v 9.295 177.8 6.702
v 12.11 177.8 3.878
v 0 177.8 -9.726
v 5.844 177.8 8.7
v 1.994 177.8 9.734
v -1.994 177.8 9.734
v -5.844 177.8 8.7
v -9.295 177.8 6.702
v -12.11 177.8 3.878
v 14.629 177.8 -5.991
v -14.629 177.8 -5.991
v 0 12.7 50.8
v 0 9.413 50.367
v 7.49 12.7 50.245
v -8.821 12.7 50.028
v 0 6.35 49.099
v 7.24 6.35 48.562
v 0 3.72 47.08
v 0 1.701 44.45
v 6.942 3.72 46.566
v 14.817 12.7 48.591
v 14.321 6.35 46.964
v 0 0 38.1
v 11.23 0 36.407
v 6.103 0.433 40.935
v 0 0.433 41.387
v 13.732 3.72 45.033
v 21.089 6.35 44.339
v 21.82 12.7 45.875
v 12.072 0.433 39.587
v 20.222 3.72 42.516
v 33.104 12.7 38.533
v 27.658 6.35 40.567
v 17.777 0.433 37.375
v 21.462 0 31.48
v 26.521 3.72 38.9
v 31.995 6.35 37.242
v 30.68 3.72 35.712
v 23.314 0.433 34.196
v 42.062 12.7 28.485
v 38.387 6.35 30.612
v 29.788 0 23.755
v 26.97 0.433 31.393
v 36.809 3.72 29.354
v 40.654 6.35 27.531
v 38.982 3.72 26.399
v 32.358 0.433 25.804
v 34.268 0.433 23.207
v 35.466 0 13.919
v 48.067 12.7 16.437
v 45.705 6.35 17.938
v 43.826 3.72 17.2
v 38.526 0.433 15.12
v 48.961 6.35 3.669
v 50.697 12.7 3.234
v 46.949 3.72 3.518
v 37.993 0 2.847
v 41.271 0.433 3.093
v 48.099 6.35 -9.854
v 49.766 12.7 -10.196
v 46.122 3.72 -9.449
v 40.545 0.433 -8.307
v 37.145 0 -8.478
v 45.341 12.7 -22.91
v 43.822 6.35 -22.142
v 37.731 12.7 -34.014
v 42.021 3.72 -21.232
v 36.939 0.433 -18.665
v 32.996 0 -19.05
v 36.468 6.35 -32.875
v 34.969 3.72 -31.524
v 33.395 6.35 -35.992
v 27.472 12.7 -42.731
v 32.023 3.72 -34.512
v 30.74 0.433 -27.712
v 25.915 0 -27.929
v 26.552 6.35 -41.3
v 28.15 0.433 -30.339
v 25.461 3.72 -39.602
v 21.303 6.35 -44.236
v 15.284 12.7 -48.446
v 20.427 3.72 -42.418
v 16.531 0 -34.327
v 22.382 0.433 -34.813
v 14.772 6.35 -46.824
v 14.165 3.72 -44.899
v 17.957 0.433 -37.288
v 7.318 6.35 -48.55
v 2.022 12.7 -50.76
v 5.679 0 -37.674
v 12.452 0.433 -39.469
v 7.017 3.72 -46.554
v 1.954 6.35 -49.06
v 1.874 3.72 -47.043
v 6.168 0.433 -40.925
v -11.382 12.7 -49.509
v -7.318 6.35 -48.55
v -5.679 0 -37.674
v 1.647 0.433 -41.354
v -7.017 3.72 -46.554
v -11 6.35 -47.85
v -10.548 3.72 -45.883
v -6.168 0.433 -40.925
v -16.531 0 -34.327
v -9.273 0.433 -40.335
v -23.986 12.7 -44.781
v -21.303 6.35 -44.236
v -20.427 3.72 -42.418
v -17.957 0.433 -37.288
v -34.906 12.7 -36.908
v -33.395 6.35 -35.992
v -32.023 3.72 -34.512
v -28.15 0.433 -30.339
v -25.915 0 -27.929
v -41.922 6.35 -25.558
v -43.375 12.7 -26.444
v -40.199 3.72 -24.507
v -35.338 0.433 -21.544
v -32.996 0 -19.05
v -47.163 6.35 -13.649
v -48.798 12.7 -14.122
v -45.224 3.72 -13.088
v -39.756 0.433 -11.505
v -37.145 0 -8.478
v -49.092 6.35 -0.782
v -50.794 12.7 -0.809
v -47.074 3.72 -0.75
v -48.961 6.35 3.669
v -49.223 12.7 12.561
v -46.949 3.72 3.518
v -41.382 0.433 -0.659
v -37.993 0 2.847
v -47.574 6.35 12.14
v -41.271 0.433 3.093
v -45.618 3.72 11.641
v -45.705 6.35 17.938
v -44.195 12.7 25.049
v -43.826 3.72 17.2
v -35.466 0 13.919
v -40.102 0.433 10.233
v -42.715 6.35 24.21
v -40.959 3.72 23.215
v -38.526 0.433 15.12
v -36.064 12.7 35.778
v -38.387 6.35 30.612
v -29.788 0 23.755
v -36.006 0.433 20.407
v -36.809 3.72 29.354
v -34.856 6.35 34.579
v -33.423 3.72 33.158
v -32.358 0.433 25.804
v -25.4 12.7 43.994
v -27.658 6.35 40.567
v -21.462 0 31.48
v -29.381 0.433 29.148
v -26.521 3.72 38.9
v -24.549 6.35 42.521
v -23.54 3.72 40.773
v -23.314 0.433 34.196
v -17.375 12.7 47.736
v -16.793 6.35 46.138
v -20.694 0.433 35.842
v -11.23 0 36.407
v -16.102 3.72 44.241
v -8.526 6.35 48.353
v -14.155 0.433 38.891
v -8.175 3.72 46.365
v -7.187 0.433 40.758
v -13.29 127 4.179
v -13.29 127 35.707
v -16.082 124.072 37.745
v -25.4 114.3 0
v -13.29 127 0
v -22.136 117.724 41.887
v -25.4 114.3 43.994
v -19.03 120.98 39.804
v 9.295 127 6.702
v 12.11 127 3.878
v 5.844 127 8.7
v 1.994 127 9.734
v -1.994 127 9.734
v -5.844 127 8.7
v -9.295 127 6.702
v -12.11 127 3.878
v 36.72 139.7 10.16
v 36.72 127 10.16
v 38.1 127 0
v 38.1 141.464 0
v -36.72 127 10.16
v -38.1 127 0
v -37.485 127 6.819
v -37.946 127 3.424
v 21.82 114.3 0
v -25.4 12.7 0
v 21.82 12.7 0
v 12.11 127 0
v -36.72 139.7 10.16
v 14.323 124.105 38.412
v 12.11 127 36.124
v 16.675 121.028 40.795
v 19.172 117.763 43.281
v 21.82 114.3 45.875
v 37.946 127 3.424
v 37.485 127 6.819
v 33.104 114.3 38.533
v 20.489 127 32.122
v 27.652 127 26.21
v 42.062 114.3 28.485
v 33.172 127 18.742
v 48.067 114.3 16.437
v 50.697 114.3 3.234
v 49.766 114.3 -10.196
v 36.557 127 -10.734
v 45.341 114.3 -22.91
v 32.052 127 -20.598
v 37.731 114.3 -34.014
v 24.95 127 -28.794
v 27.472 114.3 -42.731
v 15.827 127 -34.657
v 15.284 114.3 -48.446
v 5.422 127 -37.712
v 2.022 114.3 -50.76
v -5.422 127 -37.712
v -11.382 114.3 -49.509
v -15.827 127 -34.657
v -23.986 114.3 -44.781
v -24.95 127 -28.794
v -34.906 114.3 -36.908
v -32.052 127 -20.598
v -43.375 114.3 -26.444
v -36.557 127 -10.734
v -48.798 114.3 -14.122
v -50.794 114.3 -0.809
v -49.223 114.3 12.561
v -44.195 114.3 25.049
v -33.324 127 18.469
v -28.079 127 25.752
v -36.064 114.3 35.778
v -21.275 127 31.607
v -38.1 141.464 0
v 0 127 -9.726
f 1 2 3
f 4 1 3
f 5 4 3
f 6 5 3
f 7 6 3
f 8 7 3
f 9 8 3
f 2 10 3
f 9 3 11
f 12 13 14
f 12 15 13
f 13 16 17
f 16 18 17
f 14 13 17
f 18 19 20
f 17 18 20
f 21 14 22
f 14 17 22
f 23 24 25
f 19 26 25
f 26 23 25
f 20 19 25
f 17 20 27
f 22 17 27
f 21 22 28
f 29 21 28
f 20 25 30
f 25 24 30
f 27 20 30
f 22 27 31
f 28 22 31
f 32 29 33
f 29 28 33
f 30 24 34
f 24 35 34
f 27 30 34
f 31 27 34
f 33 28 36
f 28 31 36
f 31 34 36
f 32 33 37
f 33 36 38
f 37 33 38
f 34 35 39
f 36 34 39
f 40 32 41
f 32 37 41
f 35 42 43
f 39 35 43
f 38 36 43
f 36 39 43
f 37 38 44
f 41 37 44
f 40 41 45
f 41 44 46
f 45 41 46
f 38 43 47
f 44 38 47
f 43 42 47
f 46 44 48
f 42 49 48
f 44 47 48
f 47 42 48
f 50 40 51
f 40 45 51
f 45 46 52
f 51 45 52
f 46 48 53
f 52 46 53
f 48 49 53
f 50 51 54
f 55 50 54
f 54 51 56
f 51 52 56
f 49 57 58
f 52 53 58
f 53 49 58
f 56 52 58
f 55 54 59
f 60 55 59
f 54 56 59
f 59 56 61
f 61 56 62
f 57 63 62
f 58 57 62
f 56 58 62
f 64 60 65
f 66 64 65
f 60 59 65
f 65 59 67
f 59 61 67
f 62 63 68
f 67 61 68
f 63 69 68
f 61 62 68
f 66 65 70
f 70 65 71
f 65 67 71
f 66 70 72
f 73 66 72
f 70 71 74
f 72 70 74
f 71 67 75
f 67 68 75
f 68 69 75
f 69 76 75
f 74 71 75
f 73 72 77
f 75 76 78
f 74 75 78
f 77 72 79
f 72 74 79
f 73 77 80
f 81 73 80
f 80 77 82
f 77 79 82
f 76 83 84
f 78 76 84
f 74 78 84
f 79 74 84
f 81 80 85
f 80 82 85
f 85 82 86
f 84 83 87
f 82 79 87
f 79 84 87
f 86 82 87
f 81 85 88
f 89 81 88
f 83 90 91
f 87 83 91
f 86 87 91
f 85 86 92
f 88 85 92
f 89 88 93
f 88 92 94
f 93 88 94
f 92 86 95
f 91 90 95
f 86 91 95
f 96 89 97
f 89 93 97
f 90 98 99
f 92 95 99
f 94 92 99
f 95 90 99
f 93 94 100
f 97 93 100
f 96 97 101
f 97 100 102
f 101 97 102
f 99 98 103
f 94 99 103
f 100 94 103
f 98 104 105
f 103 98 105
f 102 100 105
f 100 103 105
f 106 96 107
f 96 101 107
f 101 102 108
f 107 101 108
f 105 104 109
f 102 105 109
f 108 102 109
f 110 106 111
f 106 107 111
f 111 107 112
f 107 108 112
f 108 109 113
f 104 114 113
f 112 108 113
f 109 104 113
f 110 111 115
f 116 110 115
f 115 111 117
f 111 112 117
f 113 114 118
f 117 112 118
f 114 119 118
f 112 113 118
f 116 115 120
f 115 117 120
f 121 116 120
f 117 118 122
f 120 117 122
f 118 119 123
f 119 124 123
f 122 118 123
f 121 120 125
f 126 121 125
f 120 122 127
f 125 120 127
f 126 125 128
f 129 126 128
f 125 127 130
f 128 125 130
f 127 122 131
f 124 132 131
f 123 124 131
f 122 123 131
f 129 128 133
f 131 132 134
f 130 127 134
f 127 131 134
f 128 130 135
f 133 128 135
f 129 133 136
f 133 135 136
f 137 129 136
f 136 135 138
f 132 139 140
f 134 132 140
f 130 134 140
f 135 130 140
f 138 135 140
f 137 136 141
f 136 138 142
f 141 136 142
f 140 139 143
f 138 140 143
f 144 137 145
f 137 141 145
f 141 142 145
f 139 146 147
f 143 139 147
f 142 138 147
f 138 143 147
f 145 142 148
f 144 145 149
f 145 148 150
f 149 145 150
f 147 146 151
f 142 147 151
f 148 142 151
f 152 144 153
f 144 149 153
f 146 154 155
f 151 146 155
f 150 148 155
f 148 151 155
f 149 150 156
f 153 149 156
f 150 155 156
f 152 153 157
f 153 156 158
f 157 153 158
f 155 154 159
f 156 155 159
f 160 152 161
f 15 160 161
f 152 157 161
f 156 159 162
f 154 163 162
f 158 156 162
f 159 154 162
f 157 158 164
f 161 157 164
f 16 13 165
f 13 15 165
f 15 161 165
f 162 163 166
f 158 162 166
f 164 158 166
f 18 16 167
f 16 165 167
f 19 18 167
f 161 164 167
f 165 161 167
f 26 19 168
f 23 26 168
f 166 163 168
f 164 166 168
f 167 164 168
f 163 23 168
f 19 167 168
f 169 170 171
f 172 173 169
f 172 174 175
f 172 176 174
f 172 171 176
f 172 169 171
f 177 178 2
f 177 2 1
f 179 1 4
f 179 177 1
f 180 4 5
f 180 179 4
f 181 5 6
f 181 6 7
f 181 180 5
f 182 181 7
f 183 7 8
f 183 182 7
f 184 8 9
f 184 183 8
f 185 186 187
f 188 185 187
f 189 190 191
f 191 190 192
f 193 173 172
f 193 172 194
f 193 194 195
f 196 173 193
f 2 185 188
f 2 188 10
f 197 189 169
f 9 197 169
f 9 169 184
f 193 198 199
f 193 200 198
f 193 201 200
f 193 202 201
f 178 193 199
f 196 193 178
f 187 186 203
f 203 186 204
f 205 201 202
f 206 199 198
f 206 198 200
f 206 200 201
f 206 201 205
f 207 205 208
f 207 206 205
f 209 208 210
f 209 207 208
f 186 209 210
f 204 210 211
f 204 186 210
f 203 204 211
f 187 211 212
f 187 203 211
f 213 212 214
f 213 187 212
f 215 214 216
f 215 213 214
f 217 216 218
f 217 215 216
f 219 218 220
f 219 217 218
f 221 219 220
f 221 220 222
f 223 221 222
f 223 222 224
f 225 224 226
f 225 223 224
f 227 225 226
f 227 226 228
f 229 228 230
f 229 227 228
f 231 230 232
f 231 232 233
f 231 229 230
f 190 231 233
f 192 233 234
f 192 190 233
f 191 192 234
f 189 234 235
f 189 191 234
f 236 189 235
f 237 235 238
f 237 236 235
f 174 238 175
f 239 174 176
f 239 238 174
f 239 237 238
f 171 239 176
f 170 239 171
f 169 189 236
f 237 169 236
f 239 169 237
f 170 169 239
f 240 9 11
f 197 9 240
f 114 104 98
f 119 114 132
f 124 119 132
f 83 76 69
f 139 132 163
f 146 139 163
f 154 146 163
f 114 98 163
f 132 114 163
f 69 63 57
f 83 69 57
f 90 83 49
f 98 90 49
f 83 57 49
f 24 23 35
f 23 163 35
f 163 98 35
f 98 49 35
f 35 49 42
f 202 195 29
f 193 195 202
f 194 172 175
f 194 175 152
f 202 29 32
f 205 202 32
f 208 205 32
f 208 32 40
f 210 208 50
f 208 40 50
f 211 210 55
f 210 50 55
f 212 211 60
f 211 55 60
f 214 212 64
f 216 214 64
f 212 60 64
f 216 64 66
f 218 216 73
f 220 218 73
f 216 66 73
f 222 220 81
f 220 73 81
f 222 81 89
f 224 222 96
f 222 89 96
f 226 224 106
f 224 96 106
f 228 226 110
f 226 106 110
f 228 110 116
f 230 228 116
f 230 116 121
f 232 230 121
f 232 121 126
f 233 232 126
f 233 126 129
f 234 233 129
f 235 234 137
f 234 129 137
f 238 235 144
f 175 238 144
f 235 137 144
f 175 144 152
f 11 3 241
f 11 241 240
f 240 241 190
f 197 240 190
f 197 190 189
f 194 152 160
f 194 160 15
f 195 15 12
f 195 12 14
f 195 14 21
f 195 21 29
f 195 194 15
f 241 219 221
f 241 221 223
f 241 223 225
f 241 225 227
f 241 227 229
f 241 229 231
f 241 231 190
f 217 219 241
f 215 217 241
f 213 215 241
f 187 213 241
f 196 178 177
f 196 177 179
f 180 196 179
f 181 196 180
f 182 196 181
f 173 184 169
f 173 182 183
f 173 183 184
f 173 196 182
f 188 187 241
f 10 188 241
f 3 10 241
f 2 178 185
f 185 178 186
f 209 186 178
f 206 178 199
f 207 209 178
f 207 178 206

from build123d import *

# Parameters (mm, degrees)
SKETCH1_R           = 50.8
BOSS_EXTRUDE1_DEPTH = 127
FILLET2_R           = 12.7
CHAMFER1_SIZE       = 12.7
BOSS_EXTRUDE2_DEPTH = 50.8
CUT_EXTRUDE2_DEPTH  = 193.012728369
CUT_EXTRUDE3_DEPTH  = 193.012728396
BOSS_EXTRUDE3_DEPTH = 50.8
CUT_EXTRUDE4_REACH  = 193.766


with BuildPart() as part:
    # Sketch1 → Boss-Extrude1 (new body)
    with BuildSketch(Plane(origin=(0, 0, 0), x_dir=(1, 0, 0), z_dir=(0, 1, 0))):
        with Locations(Location((0, 0, 0), (0, 0, 270))):
            Circle(SKETCH1_R)
    extrude(amount=BOSS_EXTRUDE1_DEPTH)

    # Fillet2
    fillet2_edges = [part.edges().sort_by_distance(p)[0] for p in [
        (0, 0, -50.8),
    ]]
    fillet(fillet2_edges, radius=FILLET2_R)

    # Chamfer1
    chamfer1_edges = [part.edges().sort_by_distance(p)[0] for p in [
        (0, 127, -50.8),
    ]]
    chamfer(chamfer1_edges, length=CHAMFER1_SIZE)

    # Sketch2 → Boss-Extrude2 (add)
    with BuildSketch(Plane(origin=(0, 127, 0), x_dir=(1, 0, 0), z_dir=(0, 1, 0))):
        Polygon((0, 9.725532547), (-38.1, -4.635e-06), (-36.720352746, -10.160004635), (0, -0.786640962), (36.720352746, -10.160004635), (38.1, -4.635e-06), align=None)
    extrude(amount=BOSS_EXTRUDE2_DEPTH)

    # Sketch3 → Cut-Extrude2 (cut, through all)
    with BuildSketch(Plane(origin=(0.18851702, 0, 0.738519458), x_dir=(0.9689306468108195, 0, -0.24733257300801867), z_dir=(0.2473325730080187, 0, 0.9689306468108196))):
        Polygon((-38.092375226, 139.7), (-38.092375226, 177.8), (-12.692375226, 177.8), align=None)
    extrude(amount=-CUT_EXTRUDE2_DEPTH, mode=Mode.SUBTRACT)

    # Sketch4 → Cut-Extrude3 (cut, through all)
    with BuildSketch(Plane(origin=(-0.18851702, 0, 0.738519458), x_dir=(0.9689306468108199, 0, 0.24733257300801748), z_dir=(-0.24733257300801748, 0, 0.9689306468108199))):
        Polygon((12.692375226, 177.8), (38.092375226, 177.8), (38.092375226, 139.7), align=None)
    extrude(amount=-CUT_EXTRUDE3_DEPTH, mode=Mode.SUBTRACT)

    # Sketch5 → Boss-Extrude3 (add)
    with BuildSketch(Plane(origin=(0, 127, 0), x_dir=(1, 0, 0), z_dir=(0, 1, 0))):
        with BuildLine():
            Line((-12.109514317, -3.87775728), (0, -0.786640962))
            Line((0, -0.786640962), (12.109514317, -3.87775728))
            ThreePointArc((12.109514317, -3.87775728), (0, -9.864797592), (-12.109514317, -3.87775728))
        make_face()
    extrude(amount=BOSS_EXTRUDE3_DEPTH)

    # Sketch6 → Cut-Extrude4 (cut, up to next)
    with BuildSketch(Plane.XY, mode=Mode.PRIVATE) as cut_extrude4_sk1:
        Polygon((-13.290485683, 127), (-25.4, 114.3), (-25.4, 12.7), (21.819967816, 12.7), (21.819967816, 114.3), (12.109514317, 127), align=None)
    cut_extrude4_tool1 = extrude(cut_extrude4_sk1.sketch, amount=CUT_EXTRUDE4_REACH, mode=Mode.PRIVATE) & part.part
    add(cut_extrude4_tool1.solids().sort_by_distance((-1.74269, 68.455742, 0))[0], mode=Mode.SUBTRACT)


solid = part.part
